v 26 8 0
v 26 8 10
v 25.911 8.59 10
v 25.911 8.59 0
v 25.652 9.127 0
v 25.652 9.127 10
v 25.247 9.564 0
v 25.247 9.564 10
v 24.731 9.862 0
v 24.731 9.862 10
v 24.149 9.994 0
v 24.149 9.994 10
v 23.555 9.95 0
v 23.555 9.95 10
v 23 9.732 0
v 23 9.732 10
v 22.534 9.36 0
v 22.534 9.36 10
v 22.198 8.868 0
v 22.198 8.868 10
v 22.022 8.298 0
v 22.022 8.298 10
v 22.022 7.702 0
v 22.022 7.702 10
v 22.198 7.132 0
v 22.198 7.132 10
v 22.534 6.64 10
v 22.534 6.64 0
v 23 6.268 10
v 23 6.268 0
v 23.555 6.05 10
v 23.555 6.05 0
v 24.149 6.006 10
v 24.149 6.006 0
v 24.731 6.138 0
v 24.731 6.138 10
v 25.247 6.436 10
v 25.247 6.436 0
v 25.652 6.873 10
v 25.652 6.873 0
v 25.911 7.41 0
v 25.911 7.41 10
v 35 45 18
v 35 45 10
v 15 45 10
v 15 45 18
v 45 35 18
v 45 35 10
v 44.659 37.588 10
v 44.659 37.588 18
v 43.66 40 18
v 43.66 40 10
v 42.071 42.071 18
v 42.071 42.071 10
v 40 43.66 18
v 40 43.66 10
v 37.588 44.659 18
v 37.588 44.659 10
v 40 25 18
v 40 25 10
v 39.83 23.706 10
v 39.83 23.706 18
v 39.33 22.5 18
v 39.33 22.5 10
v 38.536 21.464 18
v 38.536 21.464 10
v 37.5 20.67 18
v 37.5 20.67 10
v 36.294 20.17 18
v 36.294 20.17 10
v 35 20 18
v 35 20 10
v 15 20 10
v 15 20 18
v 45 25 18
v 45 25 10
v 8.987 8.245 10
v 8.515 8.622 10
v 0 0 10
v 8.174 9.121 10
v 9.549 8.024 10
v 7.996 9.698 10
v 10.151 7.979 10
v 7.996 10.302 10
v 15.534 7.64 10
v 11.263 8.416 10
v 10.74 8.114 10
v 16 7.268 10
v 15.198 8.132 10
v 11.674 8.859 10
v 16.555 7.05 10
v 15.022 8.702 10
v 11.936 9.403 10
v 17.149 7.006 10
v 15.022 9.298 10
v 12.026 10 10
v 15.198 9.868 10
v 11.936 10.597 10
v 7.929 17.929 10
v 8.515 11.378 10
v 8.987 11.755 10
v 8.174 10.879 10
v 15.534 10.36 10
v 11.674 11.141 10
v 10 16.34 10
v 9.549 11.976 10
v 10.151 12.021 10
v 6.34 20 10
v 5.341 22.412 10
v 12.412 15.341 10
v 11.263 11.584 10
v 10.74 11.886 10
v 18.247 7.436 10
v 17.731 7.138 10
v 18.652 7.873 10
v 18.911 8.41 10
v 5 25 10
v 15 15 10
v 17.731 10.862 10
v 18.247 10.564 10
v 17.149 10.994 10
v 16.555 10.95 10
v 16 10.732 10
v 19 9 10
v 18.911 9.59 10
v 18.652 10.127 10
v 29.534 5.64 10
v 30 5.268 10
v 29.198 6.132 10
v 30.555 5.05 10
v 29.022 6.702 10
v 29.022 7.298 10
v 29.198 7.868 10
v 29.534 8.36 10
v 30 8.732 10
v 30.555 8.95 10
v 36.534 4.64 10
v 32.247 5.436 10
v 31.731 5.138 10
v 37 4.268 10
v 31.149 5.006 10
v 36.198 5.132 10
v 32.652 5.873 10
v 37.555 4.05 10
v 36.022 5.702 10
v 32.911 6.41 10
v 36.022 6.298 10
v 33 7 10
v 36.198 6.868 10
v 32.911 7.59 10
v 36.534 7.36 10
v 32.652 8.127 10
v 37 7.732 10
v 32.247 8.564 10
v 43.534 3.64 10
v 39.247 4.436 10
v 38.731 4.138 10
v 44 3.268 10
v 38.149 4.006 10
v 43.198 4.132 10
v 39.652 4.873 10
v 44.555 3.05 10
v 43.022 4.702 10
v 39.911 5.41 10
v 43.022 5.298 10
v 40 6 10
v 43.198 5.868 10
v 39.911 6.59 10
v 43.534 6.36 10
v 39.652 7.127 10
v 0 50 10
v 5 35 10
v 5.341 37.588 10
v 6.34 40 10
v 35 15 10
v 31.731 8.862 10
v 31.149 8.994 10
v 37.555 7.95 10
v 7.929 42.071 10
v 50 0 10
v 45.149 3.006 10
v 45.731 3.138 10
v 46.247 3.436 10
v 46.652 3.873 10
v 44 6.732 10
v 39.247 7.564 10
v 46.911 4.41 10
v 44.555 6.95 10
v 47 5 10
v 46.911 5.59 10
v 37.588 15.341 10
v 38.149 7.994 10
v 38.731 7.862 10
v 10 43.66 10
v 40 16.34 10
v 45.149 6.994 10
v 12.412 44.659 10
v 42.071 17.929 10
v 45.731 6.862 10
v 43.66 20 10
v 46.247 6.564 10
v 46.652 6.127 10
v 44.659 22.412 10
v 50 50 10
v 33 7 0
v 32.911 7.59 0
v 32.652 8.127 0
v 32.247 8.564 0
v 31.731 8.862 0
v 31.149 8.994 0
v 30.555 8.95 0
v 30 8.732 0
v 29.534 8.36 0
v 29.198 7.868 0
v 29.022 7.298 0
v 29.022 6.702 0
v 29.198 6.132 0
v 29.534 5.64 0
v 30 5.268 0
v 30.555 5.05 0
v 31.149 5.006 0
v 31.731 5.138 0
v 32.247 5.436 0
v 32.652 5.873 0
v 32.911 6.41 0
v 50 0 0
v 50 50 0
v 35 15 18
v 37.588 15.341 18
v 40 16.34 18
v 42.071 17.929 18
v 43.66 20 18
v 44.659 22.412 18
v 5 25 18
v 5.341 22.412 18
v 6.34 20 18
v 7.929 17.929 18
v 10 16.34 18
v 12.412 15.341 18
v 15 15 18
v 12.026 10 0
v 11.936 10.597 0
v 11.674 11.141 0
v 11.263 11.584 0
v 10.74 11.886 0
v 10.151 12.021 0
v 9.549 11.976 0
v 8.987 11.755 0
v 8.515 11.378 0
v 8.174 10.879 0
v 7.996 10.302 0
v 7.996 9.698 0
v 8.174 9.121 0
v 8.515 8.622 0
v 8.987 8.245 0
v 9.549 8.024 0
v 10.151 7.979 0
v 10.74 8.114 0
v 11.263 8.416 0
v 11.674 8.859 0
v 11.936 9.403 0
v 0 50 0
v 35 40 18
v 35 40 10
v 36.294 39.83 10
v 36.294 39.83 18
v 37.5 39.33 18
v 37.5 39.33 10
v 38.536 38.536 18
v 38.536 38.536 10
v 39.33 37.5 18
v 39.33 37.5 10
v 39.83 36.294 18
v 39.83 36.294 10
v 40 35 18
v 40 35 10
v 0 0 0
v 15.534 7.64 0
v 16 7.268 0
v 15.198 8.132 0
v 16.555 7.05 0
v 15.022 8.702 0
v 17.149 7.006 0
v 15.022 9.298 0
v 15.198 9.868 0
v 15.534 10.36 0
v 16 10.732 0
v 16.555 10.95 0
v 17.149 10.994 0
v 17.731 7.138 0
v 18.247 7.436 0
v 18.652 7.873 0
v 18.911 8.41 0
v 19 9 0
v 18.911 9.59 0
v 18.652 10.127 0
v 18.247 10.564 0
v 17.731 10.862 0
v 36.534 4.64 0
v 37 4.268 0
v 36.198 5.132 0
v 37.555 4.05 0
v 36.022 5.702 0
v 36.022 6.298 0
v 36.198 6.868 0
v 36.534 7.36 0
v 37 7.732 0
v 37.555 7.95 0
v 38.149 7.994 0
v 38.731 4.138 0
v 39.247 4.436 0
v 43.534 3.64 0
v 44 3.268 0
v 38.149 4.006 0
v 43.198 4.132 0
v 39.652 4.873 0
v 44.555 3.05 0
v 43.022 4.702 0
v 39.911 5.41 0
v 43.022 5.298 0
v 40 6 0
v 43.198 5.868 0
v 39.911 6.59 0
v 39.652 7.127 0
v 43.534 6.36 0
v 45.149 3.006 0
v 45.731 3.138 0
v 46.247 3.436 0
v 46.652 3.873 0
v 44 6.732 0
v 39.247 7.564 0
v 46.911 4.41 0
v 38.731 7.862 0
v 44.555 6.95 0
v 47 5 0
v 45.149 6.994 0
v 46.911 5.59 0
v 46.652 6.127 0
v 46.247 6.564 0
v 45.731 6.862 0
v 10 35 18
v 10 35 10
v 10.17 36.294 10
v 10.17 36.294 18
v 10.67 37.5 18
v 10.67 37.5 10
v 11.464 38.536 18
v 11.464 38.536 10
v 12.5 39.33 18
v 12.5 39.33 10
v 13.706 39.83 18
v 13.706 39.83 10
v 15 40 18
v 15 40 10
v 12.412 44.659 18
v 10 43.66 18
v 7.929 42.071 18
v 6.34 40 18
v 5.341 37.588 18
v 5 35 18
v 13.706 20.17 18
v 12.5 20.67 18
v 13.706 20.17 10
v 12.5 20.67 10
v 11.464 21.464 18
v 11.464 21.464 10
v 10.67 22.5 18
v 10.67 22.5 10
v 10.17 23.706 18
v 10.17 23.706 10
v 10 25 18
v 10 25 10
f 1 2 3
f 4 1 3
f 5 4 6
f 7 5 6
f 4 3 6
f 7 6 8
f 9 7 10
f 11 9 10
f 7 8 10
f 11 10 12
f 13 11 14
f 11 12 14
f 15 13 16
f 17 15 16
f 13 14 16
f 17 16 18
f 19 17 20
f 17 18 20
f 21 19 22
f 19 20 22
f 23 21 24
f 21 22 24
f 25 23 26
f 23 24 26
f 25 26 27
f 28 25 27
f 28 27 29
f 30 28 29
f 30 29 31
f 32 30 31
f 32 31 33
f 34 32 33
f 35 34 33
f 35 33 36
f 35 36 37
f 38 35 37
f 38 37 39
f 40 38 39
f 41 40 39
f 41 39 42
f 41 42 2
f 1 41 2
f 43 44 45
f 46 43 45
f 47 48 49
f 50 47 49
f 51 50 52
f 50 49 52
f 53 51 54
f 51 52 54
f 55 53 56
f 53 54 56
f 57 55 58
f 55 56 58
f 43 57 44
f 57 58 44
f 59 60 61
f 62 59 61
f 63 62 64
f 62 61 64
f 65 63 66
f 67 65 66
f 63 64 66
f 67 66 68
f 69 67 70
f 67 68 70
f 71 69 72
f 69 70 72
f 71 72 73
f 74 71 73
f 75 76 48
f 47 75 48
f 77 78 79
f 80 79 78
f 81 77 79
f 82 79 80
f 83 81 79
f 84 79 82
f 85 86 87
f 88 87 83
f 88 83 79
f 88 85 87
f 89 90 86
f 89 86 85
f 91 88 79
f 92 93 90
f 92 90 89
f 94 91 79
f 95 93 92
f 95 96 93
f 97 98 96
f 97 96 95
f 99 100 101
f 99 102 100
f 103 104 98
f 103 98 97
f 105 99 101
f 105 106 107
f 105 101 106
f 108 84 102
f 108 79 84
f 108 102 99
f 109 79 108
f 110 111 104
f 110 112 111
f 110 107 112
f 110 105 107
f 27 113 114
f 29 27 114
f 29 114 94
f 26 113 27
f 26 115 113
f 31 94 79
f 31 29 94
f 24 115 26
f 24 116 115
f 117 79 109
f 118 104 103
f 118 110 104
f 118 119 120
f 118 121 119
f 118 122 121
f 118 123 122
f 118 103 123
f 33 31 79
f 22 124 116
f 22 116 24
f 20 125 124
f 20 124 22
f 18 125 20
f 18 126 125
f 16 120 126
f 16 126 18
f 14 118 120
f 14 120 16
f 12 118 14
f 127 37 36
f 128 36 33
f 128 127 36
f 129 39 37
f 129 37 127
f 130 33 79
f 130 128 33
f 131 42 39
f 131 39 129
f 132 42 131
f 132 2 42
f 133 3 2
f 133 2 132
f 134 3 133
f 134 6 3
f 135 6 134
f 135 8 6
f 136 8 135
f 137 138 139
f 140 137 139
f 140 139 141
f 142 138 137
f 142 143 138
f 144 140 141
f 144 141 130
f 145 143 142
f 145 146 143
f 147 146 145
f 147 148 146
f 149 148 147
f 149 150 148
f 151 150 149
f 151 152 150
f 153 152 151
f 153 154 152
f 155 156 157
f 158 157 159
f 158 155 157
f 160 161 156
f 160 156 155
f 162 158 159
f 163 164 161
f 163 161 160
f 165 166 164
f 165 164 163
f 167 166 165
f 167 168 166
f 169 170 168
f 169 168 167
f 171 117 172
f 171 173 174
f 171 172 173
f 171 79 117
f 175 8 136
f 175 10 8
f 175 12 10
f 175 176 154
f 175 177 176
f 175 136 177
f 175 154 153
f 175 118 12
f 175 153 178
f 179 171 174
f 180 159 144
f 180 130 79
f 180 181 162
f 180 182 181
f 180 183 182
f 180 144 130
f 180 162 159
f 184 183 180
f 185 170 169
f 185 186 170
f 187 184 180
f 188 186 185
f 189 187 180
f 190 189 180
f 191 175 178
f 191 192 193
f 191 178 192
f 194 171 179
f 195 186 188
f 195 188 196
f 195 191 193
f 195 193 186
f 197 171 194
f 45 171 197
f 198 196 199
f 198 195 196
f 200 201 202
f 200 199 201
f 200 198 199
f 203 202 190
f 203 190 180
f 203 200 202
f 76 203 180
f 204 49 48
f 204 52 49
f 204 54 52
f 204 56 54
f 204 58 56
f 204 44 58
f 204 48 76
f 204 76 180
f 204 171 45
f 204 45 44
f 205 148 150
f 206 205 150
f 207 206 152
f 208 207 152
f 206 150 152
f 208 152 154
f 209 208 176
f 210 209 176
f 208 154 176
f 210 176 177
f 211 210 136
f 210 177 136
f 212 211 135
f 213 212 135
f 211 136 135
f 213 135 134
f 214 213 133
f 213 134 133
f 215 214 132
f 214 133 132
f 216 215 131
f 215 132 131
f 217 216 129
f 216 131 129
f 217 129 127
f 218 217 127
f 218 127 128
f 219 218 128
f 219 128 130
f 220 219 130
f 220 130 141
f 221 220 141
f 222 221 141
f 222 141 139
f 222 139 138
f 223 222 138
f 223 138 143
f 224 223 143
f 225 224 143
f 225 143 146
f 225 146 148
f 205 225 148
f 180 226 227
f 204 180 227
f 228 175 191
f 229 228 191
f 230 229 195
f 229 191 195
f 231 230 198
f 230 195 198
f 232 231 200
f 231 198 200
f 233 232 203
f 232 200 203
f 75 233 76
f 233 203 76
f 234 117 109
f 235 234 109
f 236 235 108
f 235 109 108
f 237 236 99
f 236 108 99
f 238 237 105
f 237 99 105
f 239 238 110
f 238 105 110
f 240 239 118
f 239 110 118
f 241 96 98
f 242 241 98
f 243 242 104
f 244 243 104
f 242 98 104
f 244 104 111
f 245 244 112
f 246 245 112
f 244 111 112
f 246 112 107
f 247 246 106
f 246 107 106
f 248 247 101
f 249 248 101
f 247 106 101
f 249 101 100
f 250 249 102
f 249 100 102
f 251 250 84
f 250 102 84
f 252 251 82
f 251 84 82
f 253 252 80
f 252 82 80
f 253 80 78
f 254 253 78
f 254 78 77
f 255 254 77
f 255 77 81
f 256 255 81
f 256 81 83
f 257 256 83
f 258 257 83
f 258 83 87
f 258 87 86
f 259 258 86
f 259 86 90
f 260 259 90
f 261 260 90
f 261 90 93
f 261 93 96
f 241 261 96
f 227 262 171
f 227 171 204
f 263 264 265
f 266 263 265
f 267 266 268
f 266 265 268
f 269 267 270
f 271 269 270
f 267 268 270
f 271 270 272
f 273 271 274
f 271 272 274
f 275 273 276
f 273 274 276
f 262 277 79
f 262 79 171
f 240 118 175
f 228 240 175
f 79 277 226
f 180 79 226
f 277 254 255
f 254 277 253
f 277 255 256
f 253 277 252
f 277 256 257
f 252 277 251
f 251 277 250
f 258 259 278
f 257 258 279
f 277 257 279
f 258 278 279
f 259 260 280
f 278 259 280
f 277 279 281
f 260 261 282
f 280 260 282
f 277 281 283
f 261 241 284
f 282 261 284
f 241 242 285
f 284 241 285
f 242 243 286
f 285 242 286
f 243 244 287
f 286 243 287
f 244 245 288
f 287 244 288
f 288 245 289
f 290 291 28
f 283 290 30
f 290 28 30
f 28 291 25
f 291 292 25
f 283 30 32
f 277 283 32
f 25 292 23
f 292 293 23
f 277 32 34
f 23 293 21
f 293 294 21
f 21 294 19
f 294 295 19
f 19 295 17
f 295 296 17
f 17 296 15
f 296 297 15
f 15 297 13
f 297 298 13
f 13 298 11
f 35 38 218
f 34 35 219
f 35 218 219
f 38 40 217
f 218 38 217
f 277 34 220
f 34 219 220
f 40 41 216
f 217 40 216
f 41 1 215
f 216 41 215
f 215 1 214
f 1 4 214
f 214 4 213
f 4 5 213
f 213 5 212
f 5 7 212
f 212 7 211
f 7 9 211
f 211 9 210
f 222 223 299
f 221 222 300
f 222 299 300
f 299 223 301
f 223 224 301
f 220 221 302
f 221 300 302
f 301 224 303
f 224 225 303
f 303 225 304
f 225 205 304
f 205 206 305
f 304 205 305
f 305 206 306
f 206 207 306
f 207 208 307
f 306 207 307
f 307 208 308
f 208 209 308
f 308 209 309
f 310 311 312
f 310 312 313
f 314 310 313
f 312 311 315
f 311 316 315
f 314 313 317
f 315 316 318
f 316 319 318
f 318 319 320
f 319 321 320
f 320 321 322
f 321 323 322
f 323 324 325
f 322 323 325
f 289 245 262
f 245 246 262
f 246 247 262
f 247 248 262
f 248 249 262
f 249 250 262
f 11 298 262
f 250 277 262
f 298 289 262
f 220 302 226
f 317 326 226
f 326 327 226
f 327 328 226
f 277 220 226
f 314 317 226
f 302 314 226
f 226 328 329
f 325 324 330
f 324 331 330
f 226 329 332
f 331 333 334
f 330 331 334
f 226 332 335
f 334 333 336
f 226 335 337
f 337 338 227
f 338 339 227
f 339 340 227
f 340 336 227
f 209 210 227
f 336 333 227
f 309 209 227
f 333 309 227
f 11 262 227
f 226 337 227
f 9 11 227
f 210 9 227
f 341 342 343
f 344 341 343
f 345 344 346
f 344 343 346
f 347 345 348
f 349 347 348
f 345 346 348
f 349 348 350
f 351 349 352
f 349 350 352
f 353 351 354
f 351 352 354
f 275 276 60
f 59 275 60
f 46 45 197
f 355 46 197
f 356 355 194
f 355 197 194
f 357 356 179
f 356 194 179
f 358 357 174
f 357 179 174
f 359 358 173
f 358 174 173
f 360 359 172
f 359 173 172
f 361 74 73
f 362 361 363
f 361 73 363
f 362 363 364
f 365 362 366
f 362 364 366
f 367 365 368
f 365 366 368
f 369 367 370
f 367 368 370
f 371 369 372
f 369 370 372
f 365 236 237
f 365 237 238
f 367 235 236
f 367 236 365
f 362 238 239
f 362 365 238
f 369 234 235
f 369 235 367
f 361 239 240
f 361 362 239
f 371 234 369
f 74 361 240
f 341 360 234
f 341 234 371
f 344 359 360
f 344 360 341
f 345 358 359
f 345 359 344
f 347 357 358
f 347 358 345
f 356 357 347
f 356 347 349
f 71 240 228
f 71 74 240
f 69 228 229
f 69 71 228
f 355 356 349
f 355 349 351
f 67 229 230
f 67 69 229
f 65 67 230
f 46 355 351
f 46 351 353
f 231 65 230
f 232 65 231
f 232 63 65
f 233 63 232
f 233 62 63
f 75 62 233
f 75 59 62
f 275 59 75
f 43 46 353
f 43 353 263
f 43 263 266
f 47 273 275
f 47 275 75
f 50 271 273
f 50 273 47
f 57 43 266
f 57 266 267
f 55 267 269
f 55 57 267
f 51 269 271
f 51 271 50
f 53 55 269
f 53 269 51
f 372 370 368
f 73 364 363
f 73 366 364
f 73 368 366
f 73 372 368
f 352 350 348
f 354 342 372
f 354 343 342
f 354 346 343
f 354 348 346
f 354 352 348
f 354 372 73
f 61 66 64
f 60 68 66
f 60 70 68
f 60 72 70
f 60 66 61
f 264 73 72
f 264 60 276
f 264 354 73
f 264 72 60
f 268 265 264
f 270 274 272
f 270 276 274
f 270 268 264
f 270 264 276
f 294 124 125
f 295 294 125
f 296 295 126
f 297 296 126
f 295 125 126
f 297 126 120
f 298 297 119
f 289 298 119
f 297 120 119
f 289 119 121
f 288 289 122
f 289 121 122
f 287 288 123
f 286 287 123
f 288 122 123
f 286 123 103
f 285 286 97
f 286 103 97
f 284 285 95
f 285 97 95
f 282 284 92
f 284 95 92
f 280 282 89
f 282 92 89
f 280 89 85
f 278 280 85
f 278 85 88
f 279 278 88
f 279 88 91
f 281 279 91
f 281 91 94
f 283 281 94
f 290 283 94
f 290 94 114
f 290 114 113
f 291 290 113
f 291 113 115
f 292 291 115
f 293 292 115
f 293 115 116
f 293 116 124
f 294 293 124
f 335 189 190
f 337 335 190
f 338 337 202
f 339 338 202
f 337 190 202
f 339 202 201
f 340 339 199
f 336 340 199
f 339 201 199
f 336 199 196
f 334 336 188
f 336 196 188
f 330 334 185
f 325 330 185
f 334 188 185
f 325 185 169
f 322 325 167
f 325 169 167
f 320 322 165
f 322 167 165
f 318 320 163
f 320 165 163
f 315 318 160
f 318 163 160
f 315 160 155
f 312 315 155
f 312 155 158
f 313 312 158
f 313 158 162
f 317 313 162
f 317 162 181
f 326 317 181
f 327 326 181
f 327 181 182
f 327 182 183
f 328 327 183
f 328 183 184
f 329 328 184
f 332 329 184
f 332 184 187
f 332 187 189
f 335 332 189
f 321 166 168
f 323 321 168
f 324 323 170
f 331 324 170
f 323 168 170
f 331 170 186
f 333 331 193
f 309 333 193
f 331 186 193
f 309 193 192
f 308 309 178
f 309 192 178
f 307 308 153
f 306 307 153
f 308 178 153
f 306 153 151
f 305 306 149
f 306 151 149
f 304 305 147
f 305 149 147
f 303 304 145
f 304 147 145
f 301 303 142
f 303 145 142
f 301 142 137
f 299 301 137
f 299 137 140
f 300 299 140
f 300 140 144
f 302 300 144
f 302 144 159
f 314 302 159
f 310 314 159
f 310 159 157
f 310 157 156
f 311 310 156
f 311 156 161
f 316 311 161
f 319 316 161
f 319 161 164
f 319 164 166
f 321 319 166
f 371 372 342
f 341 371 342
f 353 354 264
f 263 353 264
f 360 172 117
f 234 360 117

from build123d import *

# Parameters (mm, degrees)
F0_W     = 50
F0_H     = 50
F1_DEPTH = 10
F3_DEPTH = 8
F4_R     = 2.026375
F4_R_2   = 2
F5_DEPTH = 25


with BuildPart() as f1:
    # F0 (on Top) → F1 (new body)
    with BuildSketch(Plane.XY):
        with Locations((25, 25)):
            Rectangle(F0_W, F0_H)
    extrude(amount=F1_DEPTH)

    # F2 (on face) → F3 (join)
    with BuildSketch(Plane.XY.offset(10)):
        with BuildLine():
            Line((35, 45), (15, 45))
            ThreePointArc((15, 45), (7.928932, 42.071068), (5, 35))
            Line((5, 35), (5, 25))
            ThreePointArc((5, 25), (7.928932, 17.928932), (15, 15))
            Line((15, 15), (35, 15))
            ThreePointArc((35, 15), (42.071068, 17.928932), (45, 25))
            Line((45, 25), (45, 35))
            ThreePointArc((45, 35), (42.071068, 42.071068), (35, 45))
        make_face()
        with BuildLine():
            ThreePointArc((10, 35), (11.464466, 38.535534), (15, 40))
            Line((15, 40), (35, 40))
            ThreePointArc((35, 40), (38.535534, 38.535534), (40, 35))
            Line((40, 35), (40, 25))
            ThreePointArc((40, 25), (38.535534, 21.464466), (35, 20))
            Line((35, 20), (15, 20))
            ThreePointArc((15, 20), (11.464466, 21.464466), (10, 25))
            Line((10, 25), (10, 35))
        make_face(mode=Mode.SUBTRACT)
    extrude(amount=F3_DEPTH)

    # F4 (on face) → F5 (cut)
    with BuildSketch(Plane.XY.offset(10)):
        with Locations((10, 10)):
            Circle(F4_R)
        with Locations((17, 9)):
            Circle(F4_R_2)
        with Locations((24, 8)):
            Circle(F4_R_2)
        with Locations((31, 7)):
            Circle(F4_R_2)
        with Locations((38, 6)):
            Circle(F4_R_2)
        with Locations((45, 5)):
            Circle(F4_R_2)
    extrude(amount=-F5_DEPTH, mode=Mode.SUBTRACT)


solid = f1.part
